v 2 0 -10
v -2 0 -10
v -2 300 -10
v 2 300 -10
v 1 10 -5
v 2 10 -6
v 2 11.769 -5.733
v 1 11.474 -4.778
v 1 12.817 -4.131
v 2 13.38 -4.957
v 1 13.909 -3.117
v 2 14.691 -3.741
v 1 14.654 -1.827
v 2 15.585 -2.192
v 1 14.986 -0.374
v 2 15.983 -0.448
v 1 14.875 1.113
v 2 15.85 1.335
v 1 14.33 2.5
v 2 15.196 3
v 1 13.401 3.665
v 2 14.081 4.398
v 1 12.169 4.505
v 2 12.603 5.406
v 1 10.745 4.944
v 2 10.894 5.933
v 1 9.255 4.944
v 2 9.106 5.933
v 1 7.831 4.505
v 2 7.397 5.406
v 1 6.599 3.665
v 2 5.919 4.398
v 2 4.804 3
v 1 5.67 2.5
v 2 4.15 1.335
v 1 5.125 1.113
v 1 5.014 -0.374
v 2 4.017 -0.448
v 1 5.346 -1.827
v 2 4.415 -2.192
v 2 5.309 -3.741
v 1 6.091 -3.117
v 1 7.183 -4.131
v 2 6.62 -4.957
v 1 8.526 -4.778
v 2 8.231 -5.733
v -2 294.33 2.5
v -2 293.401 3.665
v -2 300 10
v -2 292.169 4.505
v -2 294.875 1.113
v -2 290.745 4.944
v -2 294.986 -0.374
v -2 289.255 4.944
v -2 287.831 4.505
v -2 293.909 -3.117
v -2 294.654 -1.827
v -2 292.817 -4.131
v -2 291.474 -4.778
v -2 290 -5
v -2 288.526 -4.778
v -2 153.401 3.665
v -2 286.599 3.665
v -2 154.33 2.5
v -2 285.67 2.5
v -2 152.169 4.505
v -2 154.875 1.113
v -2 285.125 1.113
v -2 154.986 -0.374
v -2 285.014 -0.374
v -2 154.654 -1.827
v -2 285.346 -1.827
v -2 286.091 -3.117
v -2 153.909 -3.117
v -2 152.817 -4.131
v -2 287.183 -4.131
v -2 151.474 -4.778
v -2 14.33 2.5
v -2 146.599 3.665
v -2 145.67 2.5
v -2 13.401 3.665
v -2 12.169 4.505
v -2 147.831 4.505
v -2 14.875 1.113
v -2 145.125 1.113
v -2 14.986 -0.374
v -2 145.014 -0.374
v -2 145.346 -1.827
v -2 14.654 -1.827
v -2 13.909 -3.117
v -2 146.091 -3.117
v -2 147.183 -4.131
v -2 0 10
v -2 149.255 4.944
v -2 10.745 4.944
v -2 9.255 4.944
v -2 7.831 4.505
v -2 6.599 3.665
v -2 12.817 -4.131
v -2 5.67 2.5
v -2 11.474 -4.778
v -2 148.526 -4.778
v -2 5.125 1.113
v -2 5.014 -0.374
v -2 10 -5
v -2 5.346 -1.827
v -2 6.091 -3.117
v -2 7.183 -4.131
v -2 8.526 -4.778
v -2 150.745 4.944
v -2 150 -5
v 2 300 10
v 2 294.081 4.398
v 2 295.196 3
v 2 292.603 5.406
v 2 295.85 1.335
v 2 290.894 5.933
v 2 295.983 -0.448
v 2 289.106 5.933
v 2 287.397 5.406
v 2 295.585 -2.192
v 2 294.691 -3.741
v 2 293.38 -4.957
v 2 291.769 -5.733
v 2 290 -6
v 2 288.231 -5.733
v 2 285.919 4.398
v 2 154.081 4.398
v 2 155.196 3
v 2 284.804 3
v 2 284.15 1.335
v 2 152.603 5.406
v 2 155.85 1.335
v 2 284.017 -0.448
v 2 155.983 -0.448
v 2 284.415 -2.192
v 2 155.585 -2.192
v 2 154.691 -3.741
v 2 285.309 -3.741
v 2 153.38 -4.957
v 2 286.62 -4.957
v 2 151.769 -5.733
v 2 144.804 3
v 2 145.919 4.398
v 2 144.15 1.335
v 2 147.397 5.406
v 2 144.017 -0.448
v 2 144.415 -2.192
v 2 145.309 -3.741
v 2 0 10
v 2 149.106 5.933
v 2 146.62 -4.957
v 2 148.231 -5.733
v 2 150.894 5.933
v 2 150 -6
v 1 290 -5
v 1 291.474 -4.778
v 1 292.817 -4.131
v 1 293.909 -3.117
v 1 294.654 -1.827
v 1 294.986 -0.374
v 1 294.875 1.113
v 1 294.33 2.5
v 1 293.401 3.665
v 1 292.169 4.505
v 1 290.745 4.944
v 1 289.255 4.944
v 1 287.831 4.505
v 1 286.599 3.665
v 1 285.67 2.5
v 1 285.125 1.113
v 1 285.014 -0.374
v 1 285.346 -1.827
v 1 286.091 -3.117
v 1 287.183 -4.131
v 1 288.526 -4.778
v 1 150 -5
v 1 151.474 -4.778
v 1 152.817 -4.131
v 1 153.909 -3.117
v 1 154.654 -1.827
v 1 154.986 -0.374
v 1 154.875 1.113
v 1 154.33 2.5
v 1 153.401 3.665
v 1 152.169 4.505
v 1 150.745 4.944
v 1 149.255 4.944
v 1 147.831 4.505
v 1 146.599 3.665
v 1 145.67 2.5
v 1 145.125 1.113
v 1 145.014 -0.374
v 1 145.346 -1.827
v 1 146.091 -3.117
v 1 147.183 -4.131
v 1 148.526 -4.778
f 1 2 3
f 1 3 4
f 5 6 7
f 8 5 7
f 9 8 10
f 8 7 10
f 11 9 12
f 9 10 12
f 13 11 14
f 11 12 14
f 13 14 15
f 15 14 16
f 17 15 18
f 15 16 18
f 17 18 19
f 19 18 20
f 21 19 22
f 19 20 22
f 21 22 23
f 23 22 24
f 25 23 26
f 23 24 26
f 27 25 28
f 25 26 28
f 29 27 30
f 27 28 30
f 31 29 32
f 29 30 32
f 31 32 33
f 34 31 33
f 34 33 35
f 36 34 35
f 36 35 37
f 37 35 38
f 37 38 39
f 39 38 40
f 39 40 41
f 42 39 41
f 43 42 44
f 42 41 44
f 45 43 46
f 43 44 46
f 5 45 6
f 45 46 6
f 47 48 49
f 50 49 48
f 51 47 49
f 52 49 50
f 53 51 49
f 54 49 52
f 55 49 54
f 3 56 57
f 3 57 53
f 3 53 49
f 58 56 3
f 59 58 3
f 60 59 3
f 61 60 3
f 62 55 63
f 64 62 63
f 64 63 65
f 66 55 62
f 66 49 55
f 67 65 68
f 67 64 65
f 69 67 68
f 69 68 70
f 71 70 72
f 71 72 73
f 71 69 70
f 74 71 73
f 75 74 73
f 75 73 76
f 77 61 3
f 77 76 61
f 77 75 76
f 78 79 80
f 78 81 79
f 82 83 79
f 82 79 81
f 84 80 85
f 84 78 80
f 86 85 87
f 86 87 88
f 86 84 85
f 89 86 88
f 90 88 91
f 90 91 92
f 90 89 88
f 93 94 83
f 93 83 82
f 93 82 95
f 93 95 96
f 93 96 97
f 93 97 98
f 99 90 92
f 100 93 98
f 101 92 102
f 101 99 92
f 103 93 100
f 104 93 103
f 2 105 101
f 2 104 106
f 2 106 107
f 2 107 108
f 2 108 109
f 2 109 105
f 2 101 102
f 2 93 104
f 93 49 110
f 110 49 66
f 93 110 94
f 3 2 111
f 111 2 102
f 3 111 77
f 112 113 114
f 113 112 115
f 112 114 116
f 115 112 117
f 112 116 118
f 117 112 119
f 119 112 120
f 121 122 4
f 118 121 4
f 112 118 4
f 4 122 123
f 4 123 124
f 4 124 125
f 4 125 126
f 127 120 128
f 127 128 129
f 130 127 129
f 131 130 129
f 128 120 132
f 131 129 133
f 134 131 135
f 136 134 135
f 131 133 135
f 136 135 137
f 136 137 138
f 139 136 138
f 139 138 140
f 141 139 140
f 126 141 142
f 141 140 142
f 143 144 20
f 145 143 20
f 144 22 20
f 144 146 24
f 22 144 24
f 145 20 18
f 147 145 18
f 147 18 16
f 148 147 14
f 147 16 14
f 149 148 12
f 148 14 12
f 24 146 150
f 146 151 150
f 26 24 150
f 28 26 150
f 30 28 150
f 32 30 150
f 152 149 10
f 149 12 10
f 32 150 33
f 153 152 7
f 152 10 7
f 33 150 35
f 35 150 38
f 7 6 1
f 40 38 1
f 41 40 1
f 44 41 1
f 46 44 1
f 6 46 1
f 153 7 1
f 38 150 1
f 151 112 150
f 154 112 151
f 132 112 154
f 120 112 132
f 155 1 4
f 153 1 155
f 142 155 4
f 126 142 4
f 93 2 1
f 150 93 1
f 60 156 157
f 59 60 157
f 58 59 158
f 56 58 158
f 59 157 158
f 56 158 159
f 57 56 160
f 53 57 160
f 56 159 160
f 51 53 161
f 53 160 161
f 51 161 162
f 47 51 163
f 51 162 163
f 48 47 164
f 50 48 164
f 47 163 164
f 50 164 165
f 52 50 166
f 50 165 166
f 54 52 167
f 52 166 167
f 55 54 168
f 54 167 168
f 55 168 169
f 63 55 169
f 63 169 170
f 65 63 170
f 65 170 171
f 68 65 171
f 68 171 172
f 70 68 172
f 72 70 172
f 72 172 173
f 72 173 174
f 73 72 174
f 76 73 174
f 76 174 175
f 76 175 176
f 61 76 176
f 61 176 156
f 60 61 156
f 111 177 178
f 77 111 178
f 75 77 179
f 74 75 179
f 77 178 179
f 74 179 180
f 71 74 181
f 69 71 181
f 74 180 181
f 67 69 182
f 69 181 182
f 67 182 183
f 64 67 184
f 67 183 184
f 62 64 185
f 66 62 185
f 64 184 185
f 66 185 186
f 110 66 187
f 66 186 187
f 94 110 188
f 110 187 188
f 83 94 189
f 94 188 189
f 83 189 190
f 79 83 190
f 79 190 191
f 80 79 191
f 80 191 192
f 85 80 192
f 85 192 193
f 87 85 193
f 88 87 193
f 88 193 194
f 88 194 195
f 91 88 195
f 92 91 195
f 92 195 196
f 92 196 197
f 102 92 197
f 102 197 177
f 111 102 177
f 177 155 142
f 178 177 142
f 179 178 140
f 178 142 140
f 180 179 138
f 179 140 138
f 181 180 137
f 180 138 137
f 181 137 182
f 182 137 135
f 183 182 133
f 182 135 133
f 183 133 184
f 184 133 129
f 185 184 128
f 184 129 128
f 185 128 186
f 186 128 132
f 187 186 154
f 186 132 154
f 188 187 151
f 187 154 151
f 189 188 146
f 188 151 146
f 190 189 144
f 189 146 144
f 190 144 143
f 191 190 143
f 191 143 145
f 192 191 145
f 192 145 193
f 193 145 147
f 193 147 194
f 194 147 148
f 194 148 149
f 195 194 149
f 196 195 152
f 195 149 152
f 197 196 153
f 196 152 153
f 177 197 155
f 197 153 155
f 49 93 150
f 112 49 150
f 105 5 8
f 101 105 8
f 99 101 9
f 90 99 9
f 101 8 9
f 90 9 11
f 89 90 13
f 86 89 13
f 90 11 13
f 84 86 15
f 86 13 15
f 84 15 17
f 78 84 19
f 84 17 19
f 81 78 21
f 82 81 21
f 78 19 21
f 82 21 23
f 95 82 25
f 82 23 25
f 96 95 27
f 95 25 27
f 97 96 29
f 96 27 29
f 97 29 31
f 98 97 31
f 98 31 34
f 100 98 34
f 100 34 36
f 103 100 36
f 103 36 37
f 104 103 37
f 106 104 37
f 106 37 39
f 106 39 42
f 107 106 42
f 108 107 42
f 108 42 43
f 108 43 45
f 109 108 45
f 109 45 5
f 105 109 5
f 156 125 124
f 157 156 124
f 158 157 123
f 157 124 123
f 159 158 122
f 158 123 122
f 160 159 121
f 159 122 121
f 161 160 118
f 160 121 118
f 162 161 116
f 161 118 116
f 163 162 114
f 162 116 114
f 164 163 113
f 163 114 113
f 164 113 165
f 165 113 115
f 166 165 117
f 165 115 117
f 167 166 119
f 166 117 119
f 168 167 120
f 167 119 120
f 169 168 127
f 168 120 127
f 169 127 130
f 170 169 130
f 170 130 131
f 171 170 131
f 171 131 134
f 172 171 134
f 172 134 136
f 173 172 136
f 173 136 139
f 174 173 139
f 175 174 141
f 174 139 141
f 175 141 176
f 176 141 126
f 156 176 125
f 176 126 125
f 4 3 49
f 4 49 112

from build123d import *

# Parameters (mm, degrees)
SKETCH_1_W          = 4
SKETCH_1_H          = 20
EXTRUDE_1_DEPTH     = 300
SKETCH_2_R          = 5
CUT_EXTRUDE_1_DEPTH = 5
CHAMFER_1_SIZE      = 1


with BuildPart() as part:
    # Эскиз1 → Бобышка-Вытянуть1 (new body)
    with BuildSketch(Plane(origin=(0, 0, 0), x_dir=(1, 0, 0), z_dir=(0, 1, 0))):
        Rectangle(SKETCH_1_W, SKETCH_1_H)
    extrude(amount=EXTRUDE_1_DEPTH)

    # Эскиз2 → Вырез-Вытянуть1 (cut, through all)
    with BuildSketch(Plane(origin=(2, 0, 0), x_dir=(0, 0, -1), z_dir=(1, 0, 0))):
        with Locations((0, 290)):
            Circle(SKETCH_2_R)
        with Locations((0, 150)):
            Circle(SKETCH_2_R)
        with Locations((0, 10)):
            Circle(SKETCH_2_R)
    extrude(amount=-CUT_EXTRUDE_1_DEPTH, mode=Mode.SUBTRACT)

    # Фаска1
    chamfer_1_edges = [part.edges().sort_by_distance(p)[0] for p in [
        (2, 290, 5),
        (2, 150, 5),
        (2, 10, 5),
    ]]
    chamfer(chamfer_1_edges, length=CHAMFER_1_SIZE)


solid = part.part
